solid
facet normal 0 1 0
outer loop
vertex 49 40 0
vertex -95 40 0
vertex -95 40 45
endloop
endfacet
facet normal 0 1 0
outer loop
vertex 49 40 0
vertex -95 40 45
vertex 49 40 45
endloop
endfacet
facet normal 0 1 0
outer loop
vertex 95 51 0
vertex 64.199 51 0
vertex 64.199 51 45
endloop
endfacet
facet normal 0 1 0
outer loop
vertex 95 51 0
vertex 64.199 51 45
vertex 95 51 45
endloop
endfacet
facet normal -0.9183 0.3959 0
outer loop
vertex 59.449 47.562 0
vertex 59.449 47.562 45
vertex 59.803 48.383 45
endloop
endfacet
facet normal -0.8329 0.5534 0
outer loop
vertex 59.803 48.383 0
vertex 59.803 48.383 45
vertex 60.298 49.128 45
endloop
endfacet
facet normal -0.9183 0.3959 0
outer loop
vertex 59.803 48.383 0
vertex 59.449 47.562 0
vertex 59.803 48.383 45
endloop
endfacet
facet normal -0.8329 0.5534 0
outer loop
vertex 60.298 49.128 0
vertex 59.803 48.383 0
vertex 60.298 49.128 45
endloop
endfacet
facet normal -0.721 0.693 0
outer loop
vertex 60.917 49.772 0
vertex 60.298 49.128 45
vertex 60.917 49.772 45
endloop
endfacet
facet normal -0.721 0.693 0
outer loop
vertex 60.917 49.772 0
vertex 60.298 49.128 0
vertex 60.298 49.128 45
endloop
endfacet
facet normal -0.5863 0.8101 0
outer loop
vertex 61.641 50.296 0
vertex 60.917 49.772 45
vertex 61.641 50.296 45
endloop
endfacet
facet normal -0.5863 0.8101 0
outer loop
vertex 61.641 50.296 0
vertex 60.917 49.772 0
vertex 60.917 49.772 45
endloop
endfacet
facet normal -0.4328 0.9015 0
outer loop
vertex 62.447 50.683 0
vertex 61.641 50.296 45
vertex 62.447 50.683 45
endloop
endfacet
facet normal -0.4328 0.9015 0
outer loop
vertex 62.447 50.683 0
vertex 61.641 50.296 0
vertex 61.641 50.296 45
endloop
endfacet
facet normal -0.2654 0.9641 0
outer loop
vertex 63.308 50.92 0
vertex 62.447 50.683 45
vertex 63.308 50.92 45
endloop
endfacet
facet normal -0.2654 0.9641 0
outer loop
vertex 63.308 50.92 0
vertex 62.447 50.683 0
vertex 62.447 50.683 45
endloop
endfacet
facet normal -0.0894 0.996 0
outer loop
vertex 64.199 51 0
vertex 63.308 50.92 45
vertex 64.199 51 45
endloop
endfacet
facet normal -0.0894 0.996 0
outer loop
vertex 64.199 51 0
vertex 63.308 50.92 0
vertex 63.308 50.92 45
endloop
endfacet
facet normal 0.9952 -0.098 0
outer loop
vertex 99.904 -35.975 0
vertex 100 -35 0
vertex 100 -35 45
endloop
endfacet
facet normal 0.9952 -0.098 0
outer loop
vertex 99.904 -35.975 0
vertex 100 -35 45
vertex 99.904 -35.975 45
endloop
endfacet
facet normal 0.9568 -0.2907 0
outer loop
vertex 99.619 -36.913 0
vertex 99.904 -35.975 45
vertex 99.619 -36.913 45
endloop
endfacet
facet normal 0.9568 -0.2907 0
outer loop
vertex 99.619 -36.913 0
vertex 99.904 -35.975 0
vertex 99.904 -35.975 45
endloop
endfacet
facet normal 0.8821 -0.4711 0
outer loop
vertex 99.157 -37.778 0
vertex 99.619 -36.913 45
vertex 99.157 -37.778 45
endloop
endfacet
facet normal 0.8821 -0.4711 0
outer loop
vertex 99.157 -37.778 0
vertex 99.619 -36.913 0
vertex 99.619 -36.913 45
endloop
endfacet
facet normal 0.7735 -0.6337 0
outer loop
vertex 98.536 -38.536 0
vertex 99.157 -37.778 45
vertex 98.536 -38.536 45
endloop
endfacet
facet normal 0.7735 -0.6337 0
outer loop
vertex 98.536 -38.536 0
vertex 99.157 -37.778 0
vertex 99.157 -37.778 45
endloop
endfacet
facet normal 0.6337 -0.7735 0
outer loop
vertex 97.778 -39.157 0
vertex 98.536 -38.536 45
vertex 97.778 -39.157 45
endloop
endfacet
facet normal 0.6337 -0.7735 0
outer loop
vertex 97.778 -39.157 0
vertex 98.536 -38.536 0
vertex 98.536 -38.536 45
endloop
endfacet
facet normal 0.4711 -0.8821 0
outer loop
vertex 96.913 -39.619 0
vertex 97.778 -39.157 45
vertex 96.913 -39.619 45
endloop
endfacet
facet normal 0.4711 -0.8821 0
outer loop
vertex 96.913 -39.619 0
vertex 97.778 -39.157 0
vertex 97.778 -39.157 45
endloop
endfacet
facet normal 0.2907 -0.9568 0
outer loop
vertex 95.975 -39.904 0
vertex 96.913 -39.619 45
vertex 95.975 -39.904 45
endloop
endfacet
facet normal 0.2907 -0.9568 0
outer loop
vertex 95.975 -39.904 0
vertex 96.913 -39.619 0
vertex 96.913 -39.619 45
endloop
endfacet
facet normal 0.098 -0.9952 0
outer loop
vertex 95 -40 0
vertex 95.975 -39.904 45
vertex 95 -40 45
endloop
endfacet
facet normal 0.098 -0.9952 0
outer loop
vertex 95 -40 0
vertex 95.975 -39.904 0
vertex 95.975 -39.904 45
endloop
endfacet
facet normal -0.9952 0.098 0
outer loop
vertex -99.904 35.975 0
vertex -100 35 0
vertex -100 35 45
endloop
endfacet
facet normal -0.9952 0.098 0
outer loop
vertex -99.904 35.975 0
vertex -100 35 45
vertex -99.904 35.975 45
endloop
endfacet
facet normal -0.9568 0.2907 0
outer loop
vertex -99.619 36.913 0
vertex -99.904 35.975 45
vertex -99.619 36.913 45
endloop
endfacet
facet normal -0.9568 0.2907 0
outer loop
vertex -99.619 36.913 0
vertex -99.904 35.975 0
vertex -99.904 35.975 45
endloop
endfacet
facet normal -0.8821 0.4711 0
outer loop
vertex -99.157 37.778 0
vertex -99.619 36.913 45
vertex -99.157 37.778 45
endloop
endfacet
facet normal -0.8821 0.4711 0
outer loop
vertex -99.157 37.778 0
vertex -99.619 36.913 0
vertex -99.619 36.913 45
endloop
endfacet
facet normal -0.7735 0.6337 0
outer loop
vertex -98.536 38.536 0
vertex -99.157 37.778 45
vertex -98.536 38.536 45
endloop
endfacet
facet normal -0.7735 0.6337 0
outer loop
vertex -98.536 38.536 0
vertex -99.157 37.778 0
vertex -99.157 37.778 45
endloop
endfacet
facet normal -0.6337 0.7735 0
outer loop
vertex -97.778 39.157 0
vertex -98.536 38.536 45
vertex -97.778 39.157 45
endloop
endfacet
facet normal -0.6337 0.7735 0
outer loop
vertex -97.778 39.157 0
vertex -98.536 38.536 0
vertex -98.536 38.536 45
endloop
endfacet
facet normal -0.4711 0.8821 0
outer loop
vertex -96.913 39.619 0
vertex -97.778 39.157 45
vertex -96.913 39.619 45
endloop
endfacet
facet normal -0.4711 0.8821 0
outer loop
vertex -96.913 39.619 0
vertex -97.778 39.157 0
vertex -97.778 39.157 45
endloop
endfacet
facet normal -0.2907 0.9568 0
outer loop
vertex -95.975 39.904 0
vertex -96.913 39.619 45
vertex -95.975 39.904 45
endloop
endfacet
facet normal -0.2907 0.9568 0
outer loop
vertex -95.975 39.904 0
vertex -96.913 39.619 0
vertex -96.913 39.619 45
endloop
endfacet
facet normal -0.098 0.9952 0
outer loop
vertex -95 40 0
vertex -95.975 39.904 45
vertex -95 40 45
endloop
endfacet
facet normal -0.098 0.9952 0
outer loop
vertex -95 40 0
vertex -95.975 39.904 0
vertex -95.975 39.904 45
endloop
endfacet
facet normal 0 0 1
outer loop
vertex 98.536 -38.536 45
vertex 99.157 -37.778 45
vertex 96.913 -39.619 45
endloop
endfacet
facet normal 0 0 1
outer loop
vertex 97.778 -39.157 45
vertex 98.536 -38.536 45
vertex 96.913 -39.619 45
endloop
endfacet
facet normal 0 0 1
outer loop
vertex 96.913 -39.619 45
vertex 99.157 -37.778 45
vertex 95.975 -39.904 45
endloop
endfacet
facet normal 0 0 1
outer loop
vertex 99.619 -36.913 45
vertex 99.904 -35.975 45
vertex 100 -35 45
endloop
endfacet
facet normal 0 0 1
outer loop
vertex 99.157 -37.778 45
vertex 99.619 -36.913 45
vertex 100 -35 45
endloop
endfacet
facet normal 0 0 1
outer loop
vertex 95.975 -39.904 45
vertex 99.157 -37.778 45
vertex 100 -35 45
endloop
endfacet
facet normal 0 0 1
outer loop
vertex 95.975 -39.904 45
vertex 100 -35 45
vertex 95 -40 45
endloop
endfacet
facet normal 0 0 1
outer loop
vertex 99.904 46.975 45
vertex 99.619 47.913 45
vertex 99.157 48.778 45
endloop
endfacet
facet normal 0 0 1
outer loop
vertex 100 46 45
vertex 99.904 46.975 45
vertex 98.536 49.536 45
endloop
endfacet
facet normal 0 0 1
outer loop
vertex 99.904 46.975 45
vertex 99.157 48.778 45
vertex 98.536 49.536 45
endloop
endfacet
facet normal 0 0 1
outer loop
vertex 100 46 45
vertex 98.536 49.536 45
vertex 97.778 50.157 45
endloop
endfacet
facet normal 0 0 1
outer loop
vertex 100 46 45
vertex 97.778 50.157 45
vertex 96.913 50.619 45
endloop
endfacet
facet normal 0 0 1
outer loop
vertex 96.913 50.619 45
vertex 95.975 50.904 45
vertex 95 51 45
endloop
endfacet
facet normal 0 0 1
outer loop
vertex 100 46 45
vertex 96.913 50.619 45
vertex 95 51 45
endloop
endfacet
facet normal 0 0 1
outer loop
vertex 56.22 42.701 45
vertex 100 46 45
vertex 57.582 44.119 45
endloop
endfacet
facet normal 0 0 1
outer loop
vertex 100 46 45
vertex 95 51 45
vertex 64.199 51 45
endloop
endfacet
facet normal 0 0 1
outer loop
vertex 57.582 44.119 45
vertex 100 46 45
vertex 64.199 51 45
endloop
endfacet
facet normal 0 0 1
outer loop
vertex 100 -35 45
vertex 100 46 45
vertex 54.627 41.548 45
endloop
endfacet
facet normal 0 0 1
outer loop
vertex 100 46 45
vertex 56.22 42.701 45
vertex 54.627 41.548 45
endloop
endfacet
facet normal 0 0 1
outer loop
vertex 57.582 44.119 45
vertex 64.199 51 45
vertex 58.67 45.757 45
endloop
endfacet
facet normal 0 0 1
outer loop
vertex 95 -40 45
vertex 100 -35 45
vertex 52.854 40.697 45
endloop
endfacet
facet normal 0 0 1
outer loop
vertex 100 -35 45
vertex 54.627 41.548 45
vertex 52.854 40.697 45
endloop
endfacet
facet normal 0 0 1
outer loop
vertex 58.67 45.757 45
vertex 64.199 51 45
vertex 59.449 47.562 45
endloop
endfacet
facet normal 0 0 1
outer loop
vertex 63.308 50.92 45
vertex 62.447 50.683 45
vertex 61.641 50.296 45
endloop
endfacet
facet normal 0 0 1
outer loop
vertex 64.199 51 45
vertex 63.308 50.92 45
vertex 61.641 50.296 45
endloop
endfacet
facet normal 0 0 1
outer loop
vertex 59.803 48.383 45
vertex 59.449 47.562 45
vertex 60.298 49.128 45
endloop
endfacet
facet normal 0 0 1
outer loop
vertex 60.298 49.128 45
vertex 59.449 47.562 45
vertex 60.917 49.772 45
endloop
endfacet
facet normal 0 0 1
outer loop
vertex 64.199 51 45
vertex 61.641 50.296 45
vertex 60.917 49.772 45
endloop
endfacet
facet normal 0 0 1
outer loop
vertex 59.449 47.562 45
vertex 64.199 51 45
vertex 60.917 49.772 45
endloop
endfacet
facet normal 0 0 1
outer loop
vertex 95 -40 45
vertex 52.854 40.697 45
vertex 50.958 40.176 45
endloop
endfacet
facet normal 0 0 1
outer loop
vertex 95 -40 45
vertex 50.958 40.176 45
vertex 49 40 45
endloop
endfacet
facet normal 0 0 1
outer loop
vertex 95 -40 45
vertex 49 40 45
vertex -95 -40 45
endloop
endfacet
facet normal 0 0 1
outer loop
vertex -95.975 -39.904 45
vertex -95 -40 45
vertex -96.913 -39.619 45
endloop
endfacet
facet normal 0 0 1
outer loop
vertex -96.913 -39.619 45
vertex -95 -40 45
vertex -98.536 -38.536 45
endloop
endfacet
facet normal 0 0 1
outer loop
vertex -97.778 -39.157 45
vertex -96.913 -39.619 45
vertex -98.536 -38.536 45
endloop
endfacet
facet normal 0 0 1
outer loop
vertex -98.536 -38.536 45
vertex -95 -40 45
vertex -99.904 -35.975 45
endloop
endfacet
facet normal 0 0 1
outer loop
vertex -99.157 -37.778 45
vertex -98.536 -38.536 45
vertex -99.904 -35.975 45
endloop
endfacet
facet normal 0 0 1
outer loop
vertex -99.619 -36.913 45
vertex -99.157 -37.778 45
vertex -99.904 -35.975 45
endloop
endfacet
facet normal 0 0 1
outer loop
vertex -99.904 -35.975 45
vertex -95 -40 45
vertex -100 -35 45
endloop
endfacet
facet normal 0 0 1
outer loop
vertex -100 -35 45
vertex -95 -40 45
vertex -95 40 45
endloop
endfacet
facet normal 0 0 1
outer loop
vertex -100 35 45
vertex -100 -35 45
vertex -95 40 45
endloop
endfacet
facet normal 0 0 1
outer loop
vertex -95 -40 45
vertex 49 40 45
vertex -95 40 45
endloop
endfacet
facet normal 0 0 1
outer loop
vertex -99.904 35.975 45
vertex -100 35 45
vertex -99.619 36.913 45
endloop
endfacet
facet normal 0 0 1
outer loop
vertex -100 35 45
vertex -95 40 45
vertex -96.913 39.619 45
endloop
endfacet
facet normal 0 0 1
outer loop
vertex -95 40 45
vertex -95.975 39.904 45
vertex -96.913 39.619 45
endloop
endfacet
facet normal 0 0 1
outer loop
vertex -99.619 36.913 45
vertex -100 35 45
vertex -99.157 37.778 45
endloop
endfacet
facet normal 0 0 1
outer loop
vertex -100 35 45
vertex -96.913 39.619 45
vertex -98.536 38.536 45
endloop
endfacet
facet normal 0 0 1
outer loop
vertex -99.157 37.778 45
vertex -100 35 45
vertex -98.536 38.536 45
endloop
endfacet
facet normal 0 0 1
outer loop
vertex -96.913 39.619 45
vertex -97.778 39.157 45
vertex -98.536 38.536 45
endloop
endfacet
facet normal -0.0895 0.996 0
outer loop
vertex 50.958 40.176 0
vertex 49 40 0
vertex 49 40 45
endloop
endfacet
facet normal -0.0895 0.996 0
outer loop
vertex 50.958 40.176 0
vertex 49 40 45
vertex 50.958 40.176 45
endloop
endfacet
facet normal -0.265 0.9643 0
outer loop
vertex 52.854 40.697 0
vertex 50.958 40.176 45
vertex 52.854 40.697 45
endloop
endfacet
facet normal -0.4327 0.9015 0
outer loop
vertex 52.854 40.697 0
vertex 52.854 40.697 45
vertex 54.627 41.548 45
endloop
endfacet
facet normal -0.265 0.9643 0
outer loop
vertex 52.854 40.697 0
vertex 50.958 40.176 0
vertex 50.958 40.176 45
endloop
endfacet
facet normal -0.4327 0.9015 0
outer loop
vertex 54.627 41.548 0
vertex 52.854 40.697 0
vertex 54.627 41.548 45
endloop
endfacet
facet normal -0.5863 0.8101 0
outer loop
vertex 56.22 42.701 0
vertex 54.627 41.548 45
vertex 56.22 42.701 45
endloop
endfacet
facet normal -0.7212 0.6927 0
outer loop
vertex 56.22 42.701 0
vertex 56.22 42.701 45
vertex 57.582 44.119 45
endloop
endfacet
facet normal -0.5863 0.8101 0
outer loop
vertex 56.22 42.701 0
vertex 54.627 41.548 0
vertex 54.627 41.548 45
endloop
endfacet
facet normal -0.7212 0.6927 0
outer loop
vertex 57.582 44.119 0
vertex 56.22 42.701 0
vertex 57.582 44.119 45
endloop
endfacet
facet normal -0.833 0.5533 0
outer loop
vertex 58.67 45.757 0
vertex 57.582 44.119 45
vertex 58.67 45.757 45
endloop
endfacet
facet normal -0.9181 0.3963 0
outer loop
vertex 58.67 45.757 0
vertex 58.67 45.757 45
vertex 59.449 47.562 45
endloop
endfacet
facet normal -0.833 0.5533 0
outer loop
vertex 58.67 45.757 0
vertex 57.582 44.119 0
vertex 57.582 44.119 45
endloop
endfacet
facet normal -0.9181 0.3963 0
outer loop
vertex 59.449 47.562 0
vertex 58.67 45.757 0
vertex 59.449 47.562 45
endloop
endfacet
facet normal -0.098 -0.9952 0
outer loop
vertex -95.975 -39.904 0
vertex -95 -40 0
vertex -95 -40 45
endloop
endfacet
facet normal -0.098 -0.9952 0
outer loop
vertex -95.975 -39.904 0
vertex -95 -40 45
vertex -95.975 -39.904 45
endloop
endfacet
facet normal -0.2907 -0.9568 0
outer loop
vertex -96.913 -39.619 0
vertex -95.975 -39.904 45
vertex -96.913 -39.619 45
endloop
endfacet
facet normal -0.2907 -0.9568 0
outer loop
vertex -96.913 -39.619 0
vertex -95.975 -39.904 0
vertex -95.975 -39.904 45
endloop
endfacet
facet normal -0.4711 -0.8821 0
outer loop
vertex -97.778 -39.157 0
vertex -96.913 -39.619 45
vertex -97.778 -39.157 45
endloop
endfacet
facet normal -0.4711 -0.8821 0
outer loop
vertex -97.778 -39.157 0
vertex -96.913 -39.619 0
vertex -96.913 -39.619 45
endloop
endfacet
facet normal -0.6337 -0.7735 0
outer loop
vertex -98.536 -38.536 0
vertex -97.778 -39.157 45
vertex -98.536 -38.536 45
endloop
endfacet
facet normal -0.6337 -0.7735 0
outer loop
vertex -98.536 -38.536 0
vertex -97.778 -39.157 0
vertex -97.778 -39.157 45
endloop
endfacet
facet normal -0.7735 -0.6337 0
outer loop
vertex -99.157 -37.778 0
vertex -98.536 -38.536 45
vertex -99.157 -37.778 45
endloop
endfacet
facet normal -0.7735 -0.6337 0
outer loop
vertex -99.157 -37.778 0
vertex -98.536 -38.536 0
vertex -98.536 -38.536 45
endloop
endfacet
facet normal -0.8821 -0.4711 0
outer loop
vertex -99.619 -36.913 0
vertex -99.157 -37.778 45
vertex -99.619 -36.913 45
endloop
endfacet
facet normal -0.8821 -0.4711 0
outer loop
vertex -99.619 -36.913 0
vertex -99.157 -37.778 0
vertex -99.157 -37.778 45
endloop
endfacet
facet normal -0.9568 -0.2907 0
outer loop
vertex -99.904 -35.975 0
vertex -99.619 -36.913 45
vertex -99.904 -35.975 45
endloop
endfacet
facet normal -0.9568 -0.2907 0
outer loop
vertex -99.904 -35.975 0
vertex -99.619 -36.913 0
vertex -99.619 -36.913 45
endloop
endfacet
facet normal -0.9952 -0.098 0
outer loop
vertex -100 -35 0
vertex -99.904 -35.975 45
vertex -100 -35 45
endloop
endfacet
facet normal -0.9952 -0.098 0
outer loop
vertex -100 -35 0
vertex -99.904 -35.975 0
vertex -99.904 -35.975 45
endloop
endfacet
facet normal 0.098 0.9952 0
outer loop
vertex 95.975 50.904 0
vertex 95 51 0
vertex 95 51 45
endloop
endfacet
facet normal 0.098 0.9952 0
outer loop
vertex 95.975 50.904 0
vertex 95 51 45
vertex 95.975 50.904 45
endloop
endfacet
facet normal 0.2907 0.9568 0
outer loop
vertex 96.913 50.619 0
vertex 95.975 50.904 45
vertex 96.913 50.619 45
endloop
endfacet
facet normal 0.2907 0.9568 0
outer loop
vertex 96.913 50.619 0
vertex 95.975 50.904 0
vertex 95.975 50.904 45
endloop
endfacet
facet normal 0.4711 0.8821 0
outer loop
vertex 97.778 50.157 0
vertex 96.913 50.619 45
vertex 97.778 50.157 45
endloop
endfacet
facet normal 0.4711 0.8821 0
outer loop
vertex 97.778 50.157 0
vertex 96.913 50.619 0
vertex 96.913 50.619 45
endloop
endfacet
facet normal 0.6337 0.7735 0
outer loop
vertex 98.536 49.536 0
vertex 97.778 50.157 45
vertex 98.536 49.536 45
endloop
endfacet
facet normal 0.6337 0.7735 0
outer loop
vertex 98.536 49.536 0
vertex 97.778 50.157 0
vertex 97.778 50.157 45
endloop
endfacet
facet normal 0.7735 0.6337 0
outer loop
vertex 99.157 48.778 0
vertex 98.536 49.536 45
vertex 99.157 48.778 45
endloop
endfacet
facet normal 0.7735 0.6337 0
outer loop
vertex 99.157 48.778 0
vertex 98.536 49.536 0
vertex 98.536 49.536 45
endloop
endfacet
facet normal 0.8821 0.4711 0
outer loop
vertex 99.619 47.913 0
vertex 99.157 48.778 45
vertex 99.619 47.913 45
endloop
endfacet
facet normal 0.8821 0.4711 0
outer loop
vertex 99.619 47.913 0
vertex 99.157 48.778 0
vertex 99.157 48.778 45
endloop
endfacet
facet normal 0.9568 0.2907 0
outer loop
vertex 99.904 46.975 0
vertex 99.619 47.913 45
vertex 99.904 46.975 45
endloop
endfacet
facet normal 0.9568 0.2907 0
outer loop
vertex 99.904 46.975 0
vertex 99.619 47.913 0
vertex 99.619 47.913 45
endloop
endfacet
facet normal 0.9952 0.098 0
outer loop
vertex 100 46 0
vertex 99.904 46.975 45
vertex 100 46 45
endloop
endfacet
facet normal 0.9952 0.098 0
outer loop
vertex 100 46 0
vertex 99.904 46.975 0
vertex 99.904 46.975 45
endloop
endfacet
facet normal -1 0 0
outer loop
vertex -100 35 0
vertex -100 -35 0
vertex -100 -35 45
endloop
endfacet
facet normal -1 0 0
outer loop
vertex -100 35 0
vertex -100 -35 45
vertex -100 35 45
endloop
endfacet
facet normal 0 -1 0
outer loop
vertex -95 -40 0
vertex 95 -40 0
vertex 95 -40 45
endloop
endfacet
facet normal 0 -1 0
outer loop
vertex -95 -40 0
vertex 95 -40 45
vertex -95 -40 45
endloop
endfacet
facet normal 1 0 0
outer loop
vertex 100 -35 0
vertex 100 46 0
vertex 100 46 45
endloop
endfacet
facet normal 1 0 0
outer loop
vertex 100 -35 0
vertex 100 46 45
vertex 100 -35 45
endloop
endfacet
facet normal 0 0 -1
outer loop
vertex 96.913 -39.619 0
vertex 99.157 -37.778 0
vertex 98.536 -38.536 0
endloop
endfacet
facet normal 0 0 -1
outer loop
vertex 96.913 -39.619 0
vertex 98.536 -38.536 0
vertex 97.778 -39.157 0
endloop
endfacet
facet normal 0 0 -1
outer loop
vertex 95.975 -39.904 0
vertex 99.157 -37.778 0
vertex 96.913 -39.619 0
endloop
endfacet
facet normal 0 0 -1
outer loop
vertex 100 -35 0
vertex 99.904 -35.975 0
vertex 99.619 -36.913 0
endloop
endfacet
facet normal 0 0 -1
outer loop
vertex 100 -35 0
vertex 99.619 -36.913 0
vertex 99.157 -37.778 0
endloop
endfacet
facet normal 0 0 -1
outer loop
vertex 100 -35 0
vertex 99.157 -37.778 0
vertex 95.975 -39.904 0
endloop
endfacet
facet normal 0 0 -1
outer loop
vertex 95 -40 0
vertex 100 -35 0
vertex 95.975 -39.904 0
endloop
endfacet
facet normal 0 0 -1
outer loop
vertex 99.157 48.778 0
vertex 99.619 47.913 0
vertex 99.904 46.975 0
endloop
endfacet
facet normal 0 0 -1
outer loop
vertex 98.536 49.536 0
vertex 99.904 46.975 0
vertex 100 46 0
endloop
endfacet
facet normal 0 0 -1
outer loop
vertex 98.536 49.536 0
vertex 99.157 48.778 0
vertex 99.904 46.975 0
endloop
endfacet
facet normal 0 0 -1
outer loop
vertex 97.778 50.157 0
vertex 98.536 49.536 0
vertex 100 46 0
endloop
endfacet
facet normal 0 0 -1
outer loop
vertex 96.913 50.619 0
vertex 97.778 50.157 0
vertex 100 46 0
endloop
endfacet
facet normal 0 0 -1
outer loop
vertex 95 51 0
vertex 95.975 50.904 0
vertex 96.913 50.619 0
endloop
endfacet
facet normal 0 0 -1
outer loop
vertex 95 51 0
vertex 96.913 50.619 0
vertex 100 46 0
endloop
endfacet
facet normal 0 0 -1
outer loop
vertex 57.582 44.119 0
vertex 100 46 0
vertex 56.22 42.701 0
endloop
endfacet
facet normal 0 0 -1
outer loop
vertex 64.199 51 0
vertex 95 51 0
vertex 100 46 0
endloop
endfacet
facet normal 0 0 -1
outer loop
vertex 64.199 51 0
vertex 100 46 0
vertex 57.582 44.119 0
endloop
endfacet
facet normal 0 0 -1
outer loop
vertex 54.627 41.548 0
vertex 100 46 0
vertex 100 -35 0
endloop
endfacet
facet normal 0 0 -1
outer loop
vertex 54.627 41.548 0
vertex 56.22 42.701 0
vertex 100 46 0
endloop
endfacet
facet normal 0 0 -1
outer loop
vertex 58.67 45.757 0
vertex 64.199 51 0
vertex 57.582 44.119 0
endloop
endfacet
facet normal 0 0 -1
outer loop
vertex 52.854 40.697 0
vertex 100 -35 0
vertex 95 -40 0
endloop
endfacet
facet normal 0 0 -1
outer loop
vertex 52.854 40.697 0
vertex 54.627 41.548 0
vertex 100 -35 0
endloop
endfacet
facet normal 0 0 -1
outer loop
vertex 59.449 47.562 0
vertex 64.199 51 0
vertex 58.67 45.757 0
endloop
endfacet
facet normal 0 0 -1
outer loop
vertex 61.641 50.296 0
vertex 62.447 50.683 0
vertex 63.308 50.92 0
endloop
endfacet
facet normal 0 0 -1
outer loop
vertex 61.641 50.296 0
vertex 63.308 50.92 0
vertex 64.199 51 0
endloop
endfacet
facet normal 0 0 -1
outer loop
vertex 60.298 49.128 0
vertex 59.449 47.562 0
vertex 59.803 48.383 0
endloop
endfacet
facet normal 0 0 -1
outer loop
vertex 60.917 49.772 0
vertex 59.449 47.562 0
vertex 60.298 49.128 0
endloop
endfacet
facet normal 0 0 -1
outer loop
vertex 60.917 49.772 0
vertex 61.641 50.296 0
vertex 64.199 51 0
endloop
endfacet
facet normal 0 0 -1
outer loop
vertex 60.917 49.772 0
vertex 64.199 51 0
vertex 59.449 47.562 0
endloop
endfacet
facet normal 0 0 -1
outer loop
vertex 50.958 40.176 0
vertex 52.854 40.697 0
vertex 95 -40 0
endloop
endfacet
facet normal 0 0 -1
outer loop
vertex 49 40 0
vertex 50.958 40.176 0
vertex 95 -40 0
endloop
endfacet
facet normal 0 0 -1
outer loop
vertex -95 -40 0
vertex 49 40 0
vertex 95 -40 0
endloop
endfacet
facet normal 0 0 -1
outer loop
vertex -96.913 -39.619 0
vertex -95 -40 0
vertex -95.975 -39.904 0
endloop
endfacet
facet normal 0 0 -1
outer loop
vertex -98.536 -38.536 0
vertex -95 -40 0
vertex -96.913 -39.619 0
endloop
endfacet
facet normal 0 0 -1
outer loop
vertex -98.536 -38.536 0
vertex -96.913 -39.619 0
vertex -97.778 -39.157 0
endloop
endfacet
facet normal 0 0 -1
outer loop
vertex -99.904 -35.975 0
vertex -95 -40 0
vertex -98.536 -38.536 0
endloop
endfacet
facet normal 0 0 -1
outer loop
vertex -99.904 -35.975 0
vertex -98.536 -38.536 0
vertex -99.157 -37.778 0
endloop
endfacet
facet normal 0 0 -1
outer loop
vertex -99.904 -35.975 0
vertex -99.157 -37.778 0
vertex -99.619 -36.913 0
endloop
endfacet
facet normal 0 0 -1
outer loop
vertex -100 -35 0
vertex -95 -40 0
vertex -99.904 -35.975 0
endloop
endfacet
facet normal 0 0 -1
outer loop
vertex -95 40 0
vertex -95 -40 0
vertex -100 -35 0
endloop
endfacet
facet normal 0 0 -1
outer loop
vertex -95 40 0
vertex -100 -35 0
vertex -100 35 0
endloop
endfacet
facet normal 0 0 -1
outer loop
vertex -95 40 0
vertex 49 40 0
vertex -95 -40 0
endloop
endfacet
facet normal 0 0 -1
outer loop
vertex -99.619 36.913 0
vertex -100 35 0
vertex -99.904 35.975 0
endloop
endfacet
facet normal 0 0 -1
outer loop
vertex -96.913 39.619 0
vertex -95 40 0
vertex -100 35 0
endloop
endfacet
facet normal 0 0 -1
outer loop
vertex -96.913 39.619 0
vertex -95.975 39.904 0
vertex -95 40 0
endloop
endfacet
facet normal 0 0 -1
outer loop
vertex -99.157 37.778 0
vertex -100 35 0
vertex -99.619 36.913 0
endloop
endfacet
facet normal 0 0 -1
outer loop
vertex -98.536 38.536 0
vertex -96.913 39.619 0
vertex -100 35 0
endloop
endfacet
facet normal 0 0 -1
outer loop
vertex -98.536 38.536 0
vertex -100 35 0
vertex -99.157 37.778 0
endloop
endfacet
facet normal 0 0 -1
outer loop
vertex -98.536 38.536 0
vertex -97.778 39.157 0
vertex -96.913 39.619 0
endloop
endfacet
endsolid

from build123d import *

# Parameters (mm, degrees)
EXTRUDE1_DEPTH = 45


with BuildPart() as part:
    # Sketch1 → Extrude1 (new body)
    with BuildSketch(Plane.XY):
        with BuildLine():
            Line((-95, 40), (49, 40))
            ThreePointArc((49, 40), (55.44932167, 42.08898154), (59.449095356, 47.5625))
            ThreePointArc((59.449095356, 47.5625), (61.267174304, 50.050462937), (64.198684154, 51))
            Line((64.198684154, 51), (95, 51))
            ThreePointArc((95, 51), (98.535533906, 49.535533906), (100, 46))
            Line((100, 46), (100, -35))
            ThreePointArc((100, -35), (98.535533906, -38.535533906), (95, -40))
            Line((95, -40), (-95, -40))
            ThreePointArc((-95, -40), (-98.535533906, -38.535533906), (-100, -35))
            Line((-100, -35), (-100, 35))
            ThreePointArc((-100, 35), (-98.535533906, 38.535533906), (-95, 40))
        make_face()
    extrude(amount=EXTRUDE1_DEPTH)


solid = part.part
